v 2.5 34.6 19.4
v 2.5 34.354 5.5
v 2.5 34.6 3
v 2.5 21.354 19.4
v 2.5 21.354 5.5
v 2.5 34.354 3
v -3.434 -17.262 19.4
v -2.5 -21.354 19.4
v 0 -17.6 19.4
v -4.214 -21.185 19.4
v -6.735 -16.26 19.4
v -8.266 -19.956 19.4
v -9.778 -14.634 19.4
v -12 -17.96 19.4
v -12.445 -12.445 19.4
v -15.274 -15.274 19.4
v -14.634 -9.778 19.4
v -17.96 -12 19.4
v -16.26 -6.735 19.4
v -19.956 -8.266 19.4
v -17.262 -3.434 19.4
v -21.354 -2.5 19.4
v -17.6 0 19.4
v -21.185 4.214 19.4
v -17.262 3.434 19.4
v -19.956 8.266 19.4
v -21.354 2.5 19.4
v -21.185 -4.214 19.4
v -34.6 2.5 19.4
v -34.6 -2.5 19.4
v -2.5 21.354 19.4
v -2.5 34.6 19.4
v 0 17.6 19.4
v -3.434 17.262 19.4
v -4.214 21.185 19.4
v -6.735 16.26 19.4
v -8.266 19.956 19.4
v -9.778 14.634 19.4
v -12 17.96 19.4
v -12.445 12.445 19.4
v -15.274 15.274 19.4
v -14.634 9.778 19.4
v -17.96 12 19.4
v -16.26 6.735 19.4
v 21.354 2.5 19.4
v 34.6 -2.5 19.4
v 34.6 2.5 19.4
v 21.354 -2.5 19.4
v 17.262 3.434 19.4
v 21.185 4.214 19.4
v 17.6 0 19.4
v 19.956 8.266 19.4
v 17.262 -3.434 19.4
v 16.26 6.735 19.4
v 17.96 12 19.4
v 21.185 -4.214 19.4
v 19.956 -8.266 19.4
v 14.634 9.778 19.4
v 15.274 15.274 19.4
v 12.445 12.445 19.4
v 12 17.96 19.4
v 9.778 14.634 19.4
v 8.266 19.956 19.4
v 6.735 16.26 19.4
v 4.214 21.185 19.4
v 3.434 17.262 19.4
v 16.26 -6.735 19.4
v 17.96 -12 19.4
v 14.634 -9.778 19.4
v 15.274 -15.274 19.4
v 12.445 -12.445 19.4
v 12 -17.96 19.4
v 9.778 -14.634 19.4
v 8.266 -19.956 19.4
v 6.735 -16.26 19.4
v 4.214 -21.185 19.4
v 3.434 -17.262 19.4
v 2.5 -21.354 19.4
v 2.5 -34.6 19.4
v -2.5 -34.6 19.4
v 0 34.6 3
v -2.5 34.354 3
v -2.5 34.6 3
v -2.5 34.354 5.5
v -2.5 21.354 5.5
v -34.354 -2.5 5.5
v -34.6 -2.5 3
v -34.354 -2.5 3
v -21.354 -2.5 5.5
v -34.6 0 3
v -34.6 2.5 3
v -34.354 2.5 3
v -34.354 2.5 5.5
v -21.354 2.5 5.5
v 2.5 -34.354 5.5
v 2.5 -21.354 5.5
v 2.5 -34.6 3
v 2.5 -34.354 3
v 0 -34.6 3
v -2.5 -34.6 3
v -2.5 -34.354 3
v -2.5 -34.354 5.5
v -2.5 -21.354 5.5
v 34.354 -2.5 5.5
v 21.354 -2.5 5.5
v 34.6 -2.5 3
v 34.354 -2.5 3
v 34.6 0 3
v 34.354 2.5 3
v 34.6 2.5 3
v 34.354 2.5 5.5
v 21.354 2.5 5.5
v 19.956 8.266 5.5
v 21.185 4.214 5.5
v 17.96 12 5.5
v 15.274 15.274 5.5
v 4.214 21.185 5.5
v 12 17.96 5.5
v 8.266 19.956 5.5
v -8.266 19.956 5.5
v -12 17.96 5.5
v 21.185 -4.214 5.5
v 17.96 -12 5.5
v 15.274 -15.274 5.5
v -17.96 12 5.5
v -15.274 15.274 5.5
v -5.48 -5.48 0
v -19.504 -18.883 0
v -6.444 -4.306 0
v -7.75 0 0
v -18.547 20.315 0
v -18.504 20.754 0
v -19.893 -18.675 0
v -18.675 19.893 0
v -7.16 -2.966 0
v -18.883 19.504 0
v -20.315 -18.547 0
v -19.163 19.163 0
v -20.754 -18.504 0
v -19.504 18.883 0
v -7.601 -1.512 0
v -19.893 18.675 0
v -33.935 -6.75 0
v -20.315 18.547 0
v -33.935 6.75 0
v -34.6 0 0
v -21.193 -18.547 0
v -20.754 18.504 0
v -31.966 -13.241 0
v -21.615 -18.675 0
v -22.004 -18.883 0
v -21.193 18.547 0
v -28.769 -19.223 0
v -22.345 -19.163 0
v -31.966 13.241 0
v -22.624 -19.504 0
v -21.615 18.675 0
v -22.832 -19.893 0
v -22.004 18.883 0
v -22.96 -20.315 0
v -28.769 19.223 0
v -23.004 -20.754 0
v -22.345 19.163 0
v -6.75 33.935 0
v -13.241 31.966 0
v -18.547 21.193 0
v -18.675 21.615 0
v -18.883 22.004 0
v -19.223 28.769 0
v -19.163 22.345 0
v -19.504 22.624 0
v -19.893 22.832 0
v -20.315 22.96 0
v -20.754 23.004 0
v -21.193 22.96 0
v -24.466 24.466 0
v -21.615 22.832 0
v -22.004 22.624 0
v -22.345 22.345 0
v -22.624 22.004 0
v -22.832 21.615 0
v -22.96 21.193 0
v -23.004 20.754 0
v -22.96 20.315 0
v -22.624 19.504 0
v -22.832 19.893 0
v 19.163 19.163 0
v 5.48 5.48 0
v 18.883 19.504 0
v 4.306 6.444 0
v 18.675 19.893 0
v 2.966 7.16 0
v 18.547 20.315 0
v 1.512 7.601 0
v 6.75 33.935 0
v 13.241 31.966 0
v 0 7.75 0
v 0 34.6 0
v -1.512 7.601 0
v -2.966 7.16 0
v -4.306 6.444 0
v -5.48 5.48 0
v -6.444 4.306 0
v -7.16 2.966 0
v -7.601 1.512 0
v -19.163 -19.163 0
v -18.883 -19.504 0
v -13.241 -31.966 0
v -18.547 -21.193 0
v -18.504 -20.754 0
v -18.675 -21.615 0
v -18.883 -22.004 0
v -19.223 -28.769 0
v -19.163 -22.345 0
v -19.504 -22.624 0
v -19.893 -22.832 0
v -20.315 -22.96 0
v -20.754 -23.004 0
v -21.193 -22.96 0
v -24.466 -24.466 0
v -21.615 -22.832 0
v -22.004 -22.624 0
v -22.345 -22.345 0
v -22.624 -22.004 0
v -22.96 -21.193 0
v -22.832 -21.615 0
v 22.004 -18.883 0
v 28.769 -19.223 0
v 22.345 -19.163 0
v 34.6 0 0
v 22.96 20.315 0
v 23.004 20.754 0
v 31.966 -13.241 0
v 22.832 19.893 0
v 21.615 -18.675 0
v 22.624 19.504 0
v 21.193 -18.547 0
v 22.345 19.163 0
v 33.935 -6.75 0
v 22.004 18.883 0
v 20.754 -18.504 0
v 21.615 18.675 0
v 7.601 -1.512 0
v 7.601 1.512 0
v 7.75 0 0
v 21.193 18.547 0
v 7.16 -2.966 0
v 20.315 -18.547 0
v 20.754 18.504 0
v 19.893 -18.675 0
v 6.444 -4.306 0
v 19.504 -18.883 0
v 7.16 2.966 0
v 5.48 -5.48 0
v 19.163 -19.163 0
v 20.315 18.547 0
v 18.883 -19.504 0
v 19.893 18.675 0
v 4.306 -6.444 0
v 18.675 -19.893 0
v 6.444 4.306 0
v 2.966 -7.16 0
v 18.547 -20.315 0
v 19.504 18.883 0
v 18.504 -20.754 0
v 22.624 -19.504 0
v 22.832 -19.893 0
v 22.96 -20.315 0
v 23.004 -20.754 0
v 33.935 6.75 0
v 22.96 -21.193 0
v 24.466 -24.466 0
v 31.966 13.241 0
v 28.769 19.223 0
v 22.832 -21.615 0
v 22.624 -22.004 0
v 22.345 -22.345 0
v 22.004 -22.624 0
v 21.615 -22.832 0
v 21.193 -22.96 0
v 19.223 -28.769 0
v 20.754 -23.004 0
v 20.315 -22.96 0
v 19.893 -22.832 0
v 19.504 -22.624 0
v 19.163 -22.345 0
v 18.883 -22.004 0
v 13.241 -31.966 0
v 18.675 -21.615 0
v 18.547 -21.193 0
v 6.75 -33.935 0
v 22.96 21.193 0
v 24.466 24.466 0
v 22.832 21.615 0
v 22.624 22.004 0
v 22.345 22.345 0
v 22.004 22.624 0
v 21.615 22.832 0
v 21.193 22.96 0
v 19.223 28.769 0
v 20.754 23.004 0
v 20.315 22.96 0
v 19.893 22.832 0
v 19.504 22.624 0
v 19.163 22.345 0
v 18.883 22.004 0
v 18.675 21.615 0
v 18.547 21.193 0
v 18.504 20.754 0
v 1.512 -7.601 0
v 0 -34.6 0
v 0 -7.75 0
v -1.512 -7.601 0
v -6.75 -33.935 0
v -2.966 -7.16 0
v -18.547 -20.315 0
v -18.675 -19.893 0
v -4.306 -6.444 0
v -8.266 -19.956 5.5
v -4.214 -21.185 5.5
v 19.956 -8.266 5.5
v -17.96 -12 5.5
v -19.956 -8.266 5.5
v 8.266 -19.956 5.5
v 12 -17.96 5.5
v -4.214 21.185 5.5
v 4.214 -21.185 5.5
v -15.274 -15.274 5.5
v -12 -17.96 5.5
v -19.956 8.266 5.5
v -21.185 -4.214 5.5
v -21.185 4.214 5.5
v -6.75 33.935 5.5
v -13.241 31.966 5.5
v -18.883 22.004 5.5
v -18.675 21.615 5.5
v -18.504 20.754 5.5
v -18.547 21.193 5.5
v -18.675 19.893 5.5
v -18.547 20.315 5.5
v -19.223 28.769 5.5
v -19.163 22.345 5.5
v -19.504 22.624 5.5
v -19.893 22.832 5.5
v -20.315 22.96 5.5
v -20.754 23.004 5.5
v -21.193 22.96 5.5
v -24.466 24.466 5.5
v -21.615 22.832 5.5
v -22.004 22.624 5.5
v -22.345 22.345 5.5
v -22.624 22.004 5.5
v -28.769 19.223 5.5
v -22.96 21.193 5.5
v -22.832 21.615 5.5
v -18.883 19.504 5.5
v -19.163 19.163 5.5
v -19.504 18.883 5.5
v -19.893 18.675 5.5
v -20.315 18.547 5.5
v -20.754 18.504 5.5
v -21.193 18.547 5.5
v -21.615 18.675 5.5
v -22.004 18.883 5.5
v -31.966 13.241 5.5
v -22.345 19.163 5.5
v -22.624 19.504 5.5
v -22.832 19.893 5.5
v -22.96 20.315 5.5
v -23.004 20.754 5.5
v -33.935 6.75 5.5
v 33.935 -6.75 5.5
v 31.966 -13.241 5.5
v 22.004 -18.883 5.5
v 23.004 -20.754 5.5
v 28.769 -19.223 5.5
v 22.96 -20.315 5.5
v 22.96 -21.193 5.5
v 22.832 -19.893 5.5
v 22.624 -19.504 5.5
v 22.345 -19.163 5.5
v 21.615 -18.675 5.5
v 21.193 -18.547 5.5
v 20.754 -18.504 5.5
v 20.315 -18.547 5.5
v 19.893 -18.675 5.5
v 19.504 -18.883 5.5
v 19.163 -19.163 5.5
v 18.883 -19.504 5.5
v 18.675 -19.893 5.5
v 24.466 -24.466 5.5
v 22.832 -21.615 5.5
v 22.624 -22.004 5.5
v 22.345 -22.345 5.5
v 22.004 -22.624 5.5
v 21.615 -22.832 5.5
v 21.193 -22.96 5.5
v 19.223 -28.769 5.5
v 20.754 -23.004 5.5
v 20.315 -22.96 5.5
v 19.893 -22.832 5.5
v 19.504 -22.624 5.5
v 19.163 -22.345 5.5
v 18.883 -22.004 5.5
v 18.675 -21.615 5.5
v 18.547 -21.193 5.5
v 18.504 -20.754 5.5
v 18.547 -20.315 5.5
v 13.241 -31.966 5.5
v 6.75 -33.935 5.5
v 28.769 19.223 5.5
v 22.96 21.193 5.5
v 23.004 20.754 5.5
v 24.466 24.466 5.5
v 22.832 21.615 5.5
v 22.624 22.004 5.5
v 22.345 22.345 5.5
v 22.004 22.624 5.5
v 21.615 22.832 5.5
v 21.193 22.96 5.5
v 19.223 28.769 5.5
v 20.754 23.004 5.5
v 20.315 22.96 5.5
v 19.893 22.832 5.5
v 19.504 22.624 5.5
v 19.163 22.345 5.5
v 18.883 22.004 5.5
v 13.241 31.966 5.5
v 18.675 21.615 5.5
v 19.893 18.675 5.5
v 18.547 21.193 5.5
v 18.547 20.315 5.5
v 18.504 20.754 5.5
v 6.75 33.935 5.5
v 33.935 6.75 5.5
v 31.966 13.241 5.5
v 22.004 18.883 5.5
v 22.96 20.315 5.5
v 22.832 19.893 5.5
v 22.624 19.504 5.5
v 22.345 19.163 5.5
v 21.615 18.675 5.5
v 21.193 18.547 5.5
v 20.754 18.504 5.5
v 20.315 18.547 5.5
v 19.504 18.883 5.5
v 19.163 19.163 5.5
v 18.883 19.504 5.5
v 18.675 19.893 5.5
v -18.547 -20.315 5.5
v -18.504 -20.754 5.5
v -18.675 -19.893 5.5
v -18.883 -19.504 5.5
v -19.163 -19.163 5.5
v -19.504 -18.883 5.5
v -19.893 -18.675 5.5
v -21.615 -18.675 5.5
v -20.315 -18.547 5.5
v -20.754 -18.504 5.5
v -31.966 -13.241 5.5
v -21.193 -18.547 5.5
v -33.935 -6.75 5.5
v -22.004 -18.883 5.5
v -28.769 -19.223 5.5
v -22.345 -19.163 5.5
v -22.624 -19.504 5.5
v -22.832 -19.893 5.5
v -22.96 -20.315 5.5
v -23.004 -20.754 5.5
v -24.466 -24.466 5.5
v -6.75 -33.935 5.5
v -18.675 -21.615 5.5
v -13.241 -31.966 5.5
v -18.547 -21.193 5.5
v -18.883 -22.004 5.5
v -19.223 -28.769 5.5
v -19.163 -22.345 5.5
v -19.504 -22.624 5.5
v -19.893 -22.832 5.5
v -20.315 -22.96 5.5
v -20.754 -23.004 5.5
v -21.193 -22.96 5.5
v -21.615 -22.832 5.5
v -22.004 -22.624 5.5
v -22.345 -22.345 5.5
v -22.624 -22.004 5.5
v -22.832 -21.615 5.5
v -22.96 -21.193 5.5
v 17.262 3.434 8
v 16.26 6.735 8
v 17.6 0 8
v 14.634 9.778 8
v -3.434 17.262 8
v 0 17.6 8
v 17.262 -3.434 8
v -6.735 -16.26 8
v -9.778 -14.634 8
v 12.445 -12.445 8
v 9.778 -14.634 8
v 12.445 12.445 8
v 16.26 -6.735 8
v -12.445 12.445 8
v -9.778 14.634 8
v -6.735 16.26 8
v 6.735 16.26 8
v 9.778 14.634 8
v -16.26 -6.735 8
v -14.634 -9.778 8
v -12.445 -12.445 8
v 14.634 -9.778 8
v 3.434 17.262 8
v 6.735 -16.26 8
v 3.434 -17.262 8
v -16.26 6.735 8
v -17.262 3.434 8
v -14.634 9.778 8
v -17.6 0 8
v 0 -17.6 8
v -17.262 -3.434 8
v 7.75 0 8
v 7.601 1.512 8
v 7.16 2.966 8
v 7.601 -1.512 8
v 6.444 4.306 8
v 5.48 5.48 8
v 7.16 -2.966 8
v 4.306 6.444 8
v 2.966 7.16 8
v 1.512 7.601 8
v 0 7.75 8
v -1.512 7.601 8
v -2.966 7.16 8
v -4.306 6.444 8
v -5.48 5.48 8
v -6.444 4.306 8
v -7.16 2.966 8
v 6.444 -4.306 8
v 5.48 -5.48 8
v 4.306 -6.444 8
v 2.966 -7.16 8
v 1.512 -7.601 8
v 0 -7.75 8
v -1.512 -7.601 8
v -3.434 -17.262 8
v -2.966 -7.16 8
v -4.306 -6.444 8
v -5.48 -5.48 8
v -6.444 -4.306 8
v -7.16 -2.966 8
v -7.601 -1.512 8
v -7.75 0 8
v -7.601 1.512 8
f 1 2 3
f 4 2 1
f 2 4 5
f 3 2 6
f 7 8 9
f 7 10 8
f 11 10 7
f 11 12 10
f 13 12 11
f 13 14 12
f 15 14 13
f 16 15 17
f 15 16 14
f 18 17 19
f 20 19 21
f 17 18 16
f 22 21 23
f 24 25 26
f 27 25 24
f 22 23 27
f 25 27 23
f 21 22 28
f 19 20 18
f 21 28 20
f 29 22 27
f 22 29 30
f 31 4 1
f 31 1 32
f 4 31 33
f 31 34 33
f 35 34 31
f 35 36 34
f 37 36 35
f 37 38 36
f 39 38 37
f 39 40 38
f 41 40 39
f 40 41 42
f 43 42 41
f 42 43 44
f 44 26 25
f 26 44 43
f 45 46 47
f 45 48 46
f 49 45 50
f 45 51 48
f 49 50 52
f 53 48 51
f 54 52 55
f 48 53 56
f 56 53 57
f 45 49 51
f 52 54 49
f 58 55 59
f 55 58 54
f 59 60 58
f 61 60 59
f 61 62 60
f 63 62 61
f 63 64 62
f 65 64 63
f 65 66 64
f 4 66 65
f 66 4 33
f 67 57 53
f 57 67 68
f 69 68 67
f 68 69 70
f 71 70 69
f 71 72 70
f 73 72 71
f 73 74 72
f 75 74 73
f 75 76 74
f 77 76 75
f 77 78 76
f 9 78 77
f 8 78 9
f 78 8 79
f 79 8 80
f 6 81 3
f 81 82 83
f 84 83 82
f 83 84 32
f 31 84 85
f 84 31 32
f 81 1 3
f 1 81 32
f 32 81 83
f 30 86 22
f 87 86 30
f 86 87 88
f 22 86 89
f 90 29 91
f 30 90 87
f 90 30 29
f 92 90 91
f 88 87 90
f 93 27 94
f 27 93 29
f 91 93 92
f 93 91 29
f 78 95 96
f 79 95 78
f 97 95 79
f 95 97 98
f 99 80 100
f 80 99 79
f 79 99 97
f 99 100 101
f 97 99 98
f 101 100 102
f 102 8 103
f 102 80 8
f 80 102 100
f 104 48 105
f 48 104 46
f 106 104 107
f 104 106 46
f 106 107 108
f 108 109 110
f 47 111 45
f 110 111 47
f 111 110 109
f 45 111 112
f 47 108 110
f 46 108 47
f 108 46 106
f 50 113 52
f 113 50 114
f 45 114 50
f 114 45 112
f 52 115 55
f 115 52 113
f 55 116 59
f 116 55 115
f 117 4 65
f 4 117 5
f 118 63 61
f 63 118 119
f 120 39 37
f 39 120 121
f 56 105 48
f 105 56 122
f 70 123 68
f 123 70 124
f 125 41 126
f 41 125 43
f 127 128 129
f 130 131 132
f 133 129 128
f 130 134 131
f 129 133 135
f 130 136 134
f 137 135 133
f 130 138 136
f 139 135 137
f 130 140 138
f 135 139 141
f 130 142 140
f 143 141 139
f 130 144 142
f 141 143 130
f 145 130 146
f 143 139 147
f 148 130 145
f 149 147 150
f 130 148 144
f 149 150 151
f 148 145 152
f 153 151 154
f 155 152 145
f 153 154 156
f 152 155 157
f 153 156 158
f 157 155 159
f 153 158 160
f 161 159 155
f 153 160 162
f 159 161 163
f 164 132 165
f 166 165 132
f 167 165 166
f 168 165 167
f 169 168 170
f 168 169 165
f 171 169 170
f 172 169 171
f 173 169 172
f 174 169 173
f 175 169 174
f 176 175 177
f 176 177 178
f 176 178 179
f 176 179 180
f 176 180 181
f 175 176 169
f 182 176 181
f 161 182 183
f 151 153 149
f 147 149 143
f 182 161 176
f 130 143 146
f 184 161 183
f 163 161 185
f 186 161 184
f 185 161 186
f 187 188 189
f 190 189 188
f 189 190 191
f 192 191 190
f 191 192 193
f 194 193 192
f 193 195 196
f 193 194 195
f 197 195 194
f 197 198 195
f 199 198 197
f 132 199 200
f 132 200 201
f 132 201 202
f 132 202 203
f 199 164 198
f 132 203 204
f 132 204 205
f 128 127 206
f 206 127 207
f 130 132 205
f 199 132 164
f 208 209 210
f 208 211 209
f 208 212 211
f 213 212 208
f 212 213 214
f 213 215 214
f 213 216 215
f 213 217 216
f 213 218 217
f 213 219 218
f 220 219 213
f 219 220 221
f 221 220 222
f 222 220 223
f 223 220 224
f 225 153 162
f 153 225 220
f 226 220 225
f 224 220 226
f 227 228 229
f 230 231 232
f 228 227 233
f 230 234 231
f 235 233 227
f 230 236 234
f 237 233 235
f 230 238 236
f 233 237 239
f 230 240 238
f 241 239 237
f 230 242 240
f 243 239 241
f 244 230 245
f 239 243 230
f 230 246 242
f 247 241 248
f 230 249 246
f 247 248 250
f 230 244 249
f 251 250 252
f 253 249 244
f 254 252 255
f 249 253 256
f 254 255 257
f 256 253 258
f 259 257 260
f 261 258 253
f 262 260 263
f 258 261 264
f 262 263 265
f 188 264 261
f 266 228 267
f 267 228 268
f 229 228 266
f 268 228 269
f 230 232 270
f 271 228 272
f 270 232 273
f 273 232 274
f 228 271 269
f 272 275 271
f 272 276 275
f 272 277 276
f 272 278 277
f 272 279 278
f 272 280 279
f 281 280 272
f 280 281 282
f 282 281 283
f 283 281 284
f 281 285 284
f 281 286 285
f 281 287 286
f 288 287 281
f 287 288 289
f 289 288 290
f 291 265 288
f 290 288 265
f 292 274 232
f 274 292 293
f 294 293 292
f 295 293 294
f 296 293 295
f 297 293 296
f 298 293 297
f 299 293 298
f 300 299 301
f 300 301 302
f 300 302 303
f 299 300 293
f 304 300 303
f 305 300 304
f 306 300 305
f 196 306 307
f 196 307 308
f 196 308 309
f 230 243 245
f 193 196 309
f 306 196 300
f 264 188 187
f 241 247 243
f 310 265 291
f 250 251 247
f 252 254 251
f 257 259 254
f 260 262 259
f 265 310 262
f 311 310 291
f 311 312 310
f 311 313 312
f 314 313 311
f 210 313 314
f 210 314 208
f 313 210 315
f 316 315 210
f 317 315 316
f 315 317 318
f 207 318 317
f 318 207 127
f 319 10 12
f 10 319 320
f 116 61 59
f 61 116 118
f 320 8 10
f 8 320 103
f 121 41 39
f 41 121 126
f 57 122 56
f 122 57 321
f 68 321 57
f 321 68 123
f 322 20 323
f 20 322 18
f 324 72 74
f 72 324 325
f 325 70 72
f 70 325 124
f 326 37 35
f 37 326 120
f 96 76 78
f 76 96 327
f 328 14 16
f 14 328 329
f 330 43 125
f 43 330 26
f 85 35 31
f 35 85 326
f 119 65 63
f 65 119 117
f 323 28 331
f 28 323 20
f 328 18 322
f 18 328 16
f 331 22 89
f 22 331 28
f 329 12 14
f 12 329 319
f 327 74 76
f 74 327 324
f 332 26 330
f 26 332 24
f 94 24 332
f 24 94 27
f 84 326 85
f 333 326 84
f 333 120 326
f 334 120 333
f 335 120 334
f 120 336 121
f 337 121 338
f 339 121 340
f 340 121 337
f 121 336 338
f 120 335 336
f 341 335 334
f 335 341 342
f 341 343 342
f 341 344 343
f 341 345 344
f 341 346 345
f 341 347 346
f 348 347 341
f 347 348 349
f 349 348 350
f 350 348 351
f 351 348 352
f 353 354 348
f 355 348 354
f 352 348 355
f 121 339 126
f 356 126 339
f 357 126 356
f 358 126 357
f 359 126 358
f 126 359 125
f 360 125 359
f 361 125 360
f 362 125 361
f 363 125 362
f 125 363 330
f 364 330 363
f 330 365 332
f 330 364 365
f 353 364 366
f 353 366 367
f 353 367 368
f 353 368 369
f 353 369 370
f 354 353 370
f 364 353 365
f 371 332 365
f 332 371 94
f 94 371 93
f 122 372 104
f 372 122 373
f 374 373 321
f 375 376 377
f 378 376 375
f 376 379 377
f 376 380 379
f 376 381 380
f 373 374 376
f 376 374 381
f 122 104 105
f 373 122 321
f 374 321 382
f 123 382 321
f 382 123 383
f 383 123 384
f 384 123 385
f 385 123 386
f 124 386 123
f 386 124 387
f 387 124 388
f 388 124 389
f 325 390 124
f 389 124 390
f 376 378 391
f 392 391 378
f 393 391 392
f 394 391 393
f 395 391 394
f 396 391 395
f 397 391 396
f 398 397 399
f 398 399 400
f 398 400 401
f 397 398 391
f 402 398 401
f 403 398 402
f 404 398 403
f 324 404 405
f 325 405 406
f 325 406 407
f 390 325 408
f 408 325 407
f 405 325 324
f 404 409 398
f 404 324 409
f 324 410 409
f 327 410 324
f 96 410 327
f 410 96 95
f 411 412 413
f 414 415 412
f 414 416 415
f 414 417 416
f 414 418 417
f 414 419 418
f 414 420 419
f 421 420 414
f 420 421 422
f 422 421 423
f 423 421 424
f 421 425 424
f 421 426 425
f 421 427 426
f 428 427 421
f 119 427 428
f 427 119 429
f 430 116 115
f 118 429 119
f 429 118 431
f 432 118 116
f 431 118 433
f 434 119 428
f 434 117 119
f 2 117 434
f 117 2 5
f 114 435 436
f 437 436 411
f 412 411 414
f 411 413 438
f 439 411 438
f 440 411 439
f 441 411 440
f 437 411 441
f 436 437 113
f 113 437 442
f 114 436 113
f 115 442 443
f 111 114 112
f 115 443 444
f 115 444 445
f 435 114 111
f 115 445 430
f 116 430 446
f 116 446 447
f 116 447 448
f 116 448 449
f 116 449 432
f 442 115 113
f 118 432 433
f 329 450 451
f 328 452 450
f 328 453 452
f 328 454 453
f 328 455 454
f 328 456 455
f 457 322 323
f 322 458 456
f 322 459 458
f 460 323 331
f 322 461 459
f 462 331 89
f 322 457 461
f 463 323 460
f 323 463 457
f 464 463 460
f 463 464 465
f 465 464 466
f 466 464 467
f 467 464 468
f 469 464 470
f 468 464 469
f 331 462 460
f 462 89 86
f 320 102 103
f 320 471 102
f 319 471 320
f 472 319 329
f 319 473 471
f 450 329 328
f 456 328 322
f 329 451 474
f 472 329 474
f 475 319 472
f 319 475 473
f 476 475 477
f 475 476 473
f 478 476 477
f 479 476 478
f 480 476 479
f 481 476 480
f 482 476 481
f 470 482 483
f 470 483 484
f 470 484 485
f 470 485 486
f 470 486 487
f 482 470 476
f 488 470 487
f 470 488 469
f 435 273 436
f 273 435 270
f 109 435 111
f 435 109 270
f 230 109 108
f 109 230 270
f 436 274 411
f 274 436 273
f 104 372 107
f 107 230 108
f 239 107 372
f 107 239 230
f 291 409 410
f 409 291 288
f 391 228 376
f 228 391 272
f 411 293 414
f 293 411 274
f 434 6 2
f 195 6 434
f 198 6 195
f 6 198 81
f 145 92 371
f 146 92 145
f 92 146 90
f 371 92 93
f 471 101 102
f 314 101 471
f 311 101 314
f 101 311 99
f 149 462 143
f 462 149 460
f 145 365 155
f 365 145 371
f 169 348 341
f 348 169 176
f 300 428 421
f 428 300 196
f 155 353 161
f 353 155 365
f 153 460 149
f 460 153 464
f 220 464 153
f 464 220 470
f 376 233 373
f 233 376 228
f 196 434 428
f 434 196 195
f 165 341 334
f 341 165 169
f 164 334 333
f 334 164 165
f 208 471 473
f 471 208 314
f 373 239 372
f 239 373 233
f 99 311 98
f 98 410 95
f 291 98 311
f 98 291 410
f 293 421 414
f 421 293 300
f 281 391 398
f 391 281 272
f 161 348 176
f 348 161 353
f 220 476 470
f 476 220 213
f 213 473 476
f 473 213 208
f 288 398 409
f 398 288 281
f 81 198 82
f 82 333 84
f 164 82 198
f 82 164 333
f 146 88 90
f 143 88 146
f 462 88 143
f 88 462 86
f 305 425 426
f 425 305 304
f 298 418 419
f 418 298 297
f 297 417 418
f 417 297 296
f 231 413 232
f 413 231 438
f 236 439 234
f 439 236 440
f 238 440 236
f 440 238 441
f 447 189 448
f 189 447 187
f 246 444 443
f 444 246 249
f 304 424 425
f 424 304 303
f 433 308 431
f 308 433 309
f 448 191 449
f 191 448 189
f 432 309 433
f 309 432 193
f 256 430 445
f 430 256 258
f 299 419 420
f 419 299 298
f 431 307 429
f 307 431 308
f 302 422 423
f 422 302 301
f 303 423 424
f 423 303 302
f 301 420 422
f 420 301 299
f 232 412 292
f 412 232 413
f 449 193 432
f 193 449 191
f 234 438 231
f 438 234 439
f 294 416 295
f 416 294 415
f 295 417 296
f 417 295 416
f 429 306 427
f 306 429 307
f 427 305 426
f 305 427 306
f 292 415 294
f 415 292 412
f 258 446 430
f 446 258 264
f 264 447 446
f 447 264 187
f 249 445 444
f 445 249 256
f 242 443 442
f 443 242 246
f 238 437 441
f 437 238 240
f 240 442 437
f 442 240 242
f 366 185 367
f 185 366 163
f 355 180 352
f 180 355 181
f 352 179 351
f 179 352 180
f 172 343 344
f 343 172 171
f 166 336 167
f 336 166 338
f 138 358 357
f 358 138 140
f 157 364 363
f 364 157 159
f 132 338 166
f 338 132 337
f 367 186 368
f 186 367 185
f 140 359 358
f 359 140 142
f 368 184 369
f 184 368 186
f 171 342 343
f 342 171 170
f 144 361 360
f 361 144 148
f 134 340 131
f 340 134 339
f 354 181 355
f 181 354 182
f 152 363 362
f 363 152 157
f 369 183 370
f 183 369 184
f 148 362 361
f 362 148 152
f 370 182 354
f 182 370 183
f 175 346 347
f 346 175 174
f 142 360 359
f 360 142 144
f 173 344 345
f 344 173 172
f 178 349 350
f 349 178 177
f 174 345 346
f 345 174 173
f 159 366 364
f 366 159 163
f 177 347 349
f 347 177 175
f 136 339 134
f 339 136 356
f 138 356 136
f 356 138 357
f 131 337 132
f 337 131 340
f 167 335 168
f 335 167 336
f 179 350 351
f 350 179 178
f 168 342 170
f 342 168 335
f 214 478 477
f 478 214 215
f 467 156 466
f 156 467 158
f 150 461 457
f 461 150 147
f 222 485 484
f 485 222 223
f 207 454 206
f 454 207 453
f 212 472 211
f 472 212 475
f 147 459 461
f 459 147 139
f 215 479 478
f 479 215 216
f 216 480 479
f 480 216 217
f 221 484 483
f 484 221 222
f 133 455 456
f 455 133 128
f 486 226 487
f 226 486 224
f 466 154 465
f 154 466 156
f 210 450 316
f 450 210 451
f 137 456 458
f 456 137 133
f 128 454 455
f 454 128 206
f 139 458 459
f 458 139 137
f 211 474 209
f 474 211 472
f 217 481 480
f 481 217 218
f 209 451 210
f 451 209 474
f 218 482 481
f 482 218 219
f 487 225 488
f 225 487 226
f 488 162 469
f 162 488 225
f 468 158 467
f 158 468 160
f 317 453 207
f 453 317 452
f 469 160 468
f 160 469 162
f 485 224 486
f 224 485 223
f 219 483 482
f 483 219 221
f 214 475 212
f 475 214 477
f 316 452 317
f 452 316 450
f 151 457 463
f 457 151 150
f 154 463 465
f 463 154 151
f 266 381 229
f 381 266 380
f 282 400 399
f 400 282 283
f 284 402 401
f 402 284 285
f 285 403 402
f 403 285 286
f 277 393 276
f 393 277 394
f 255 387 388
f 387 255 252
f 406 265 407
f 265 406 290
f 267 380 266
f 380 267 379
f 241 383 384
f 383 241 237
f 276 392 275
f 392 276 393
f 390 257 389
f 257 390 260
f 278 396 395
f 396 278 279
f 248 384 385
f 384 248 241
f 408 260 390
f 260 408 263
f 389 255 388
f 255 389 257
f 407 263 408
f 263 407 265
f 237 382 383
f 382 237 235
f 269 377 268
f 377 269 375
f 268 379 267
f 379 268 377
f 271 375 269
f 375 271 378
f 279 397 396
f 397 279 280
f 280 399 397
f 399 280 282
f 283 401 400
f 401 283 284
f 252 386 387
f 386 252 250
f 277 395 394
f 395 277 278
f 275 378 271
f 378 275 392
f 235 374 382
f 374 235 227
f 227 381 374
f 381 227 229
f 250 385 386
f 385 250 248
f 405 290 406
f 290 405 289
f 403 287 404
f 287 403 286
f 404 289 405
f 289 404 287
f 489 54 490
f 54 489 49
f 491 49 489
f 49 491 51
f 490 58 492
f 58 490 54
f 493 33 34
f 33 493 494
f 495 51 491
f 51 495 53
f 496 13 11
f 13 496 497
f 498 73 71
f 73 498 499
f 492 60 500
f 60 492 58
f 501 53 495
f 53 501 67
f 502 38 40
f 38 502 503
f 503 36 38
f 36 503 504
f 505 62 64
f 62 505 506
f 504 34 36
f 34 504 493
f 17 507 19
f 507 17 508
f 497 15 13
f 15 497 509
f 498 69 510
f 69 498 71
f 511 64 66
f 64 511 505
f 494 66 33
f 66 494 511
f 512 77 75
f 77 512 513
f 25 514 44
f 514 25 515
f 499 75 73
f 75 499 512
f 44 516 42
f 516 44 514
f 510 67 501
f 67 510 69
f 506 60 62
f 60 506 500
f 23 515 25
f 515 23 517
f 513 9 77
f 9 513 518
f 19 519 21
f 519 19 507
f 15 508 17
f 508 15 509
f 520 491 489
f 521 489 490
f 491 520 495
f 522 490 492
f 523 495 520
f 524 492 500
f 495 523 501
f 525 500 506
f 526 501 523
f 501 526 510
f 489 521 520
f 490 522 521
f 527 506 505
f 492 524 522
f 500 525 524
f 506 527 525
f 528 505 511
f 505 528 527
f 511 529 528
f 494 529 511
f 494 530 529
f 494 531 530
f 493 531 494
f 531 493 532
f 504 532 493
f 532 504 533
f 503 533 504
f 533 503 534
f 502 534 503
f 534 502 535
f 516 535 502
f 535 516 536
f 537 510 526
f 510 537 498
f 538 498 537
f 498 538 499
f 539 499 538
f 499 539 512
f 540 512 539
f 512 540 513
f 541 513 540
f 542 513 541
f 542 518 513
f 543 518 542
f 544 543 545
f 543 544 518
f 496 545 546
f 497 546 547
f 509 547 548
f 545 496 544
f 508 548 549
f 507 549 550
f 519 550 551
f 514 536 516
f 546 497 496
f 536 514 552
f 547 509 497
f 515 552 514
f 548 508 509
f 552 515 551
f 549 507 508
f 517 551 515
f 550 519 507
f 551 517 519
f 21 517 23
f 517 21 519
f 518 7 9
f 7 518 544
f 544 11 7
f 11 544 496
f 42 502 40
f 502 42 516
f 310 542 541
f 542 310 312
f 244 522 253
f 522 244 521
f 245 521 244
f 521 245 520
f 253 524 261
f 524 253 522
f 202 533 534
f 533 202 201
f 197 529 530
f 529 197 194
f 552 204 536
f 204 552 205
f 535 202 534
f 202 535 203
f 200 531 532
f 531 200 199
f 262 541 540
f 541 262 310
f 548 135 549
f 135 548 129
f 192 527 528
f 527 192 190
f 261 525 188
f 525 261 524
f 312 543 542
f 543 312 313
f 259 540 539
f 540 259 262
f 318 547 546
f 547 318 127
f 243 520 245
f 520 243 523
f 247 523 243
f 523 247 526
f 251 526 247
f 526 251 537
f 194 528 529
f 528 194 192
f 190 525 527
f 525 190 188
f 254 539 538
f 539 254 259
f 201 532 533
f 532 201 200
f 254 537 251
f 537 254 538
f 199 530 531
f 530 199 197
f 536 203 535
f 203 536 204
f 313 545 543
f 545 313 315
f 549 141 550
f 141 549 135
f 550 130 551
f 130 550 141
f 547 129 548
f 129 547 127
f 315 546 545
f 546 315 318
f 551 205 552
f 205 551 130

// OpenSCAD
$fn = 32;

// ----------------------------------------------------------------------
// Bearing housing: seat for 6202 (35 x 11 mm), 43.2 mm body
// ----------------------------------------------------------------------

// --- parameters (mm) ---
housing_d = 43.2;         // housing outside diameter
housing_h = 19.4;         // overall housing height
wall_t = 4;               // wall thickness
seat_d = 35.2;            // 6202 seat, 0.2 mm clearance
seat_h = 11.4;            // pocket depth
shoulder = 4;             // shoulder under the bearing
pass_d = 15.5;            // shaft passage
flange_d = 69.2;          // mounting flange diameter
flange_t = 4;             // flange thickness
bolt_d = 4.5;             // flange bolt clearance
bolt_r = 29.35;           // flange bolt circle radius
rib_w = 5;                // rib width
rib_n = 4;                // rib count

module body() {
  cylinder(h = housing_h, d = housing_d);
}

module flange() {
  /* flange sunk 1.5 mm into the body */
  cylinder(h = flange_t + 1.5, d = flange_d);
}

module ribs() {
  for (i = [0 : rib_n - 1])
    rotate([0, 0, i * 360 / rib_n])
      translate([-rib_w / 2, housing_d / 2 - 0.8, flange_t - 1])
        cube([rib_w, (flange_d - housing_d) / 2 + 0.8, housing_h - flange_t + 1]);
}

difference() {
  union() {
    body();
    flange();
    ribs();
  }
  translate([0, 0, housing_h - seat_h]) cylinder(h = seat_h + 1, d = seat_d);
  translate([0, 0, -1]) cylinder(h = housing_h - seat_h + 1, d = pass_d);
  for (i = [0 : 3]) rotate([0, 0, 45 + i * 90]) translate([bolt_r, 0, -1])
    cylinder(h = flange_t + 3, d = bolt_d);
}
